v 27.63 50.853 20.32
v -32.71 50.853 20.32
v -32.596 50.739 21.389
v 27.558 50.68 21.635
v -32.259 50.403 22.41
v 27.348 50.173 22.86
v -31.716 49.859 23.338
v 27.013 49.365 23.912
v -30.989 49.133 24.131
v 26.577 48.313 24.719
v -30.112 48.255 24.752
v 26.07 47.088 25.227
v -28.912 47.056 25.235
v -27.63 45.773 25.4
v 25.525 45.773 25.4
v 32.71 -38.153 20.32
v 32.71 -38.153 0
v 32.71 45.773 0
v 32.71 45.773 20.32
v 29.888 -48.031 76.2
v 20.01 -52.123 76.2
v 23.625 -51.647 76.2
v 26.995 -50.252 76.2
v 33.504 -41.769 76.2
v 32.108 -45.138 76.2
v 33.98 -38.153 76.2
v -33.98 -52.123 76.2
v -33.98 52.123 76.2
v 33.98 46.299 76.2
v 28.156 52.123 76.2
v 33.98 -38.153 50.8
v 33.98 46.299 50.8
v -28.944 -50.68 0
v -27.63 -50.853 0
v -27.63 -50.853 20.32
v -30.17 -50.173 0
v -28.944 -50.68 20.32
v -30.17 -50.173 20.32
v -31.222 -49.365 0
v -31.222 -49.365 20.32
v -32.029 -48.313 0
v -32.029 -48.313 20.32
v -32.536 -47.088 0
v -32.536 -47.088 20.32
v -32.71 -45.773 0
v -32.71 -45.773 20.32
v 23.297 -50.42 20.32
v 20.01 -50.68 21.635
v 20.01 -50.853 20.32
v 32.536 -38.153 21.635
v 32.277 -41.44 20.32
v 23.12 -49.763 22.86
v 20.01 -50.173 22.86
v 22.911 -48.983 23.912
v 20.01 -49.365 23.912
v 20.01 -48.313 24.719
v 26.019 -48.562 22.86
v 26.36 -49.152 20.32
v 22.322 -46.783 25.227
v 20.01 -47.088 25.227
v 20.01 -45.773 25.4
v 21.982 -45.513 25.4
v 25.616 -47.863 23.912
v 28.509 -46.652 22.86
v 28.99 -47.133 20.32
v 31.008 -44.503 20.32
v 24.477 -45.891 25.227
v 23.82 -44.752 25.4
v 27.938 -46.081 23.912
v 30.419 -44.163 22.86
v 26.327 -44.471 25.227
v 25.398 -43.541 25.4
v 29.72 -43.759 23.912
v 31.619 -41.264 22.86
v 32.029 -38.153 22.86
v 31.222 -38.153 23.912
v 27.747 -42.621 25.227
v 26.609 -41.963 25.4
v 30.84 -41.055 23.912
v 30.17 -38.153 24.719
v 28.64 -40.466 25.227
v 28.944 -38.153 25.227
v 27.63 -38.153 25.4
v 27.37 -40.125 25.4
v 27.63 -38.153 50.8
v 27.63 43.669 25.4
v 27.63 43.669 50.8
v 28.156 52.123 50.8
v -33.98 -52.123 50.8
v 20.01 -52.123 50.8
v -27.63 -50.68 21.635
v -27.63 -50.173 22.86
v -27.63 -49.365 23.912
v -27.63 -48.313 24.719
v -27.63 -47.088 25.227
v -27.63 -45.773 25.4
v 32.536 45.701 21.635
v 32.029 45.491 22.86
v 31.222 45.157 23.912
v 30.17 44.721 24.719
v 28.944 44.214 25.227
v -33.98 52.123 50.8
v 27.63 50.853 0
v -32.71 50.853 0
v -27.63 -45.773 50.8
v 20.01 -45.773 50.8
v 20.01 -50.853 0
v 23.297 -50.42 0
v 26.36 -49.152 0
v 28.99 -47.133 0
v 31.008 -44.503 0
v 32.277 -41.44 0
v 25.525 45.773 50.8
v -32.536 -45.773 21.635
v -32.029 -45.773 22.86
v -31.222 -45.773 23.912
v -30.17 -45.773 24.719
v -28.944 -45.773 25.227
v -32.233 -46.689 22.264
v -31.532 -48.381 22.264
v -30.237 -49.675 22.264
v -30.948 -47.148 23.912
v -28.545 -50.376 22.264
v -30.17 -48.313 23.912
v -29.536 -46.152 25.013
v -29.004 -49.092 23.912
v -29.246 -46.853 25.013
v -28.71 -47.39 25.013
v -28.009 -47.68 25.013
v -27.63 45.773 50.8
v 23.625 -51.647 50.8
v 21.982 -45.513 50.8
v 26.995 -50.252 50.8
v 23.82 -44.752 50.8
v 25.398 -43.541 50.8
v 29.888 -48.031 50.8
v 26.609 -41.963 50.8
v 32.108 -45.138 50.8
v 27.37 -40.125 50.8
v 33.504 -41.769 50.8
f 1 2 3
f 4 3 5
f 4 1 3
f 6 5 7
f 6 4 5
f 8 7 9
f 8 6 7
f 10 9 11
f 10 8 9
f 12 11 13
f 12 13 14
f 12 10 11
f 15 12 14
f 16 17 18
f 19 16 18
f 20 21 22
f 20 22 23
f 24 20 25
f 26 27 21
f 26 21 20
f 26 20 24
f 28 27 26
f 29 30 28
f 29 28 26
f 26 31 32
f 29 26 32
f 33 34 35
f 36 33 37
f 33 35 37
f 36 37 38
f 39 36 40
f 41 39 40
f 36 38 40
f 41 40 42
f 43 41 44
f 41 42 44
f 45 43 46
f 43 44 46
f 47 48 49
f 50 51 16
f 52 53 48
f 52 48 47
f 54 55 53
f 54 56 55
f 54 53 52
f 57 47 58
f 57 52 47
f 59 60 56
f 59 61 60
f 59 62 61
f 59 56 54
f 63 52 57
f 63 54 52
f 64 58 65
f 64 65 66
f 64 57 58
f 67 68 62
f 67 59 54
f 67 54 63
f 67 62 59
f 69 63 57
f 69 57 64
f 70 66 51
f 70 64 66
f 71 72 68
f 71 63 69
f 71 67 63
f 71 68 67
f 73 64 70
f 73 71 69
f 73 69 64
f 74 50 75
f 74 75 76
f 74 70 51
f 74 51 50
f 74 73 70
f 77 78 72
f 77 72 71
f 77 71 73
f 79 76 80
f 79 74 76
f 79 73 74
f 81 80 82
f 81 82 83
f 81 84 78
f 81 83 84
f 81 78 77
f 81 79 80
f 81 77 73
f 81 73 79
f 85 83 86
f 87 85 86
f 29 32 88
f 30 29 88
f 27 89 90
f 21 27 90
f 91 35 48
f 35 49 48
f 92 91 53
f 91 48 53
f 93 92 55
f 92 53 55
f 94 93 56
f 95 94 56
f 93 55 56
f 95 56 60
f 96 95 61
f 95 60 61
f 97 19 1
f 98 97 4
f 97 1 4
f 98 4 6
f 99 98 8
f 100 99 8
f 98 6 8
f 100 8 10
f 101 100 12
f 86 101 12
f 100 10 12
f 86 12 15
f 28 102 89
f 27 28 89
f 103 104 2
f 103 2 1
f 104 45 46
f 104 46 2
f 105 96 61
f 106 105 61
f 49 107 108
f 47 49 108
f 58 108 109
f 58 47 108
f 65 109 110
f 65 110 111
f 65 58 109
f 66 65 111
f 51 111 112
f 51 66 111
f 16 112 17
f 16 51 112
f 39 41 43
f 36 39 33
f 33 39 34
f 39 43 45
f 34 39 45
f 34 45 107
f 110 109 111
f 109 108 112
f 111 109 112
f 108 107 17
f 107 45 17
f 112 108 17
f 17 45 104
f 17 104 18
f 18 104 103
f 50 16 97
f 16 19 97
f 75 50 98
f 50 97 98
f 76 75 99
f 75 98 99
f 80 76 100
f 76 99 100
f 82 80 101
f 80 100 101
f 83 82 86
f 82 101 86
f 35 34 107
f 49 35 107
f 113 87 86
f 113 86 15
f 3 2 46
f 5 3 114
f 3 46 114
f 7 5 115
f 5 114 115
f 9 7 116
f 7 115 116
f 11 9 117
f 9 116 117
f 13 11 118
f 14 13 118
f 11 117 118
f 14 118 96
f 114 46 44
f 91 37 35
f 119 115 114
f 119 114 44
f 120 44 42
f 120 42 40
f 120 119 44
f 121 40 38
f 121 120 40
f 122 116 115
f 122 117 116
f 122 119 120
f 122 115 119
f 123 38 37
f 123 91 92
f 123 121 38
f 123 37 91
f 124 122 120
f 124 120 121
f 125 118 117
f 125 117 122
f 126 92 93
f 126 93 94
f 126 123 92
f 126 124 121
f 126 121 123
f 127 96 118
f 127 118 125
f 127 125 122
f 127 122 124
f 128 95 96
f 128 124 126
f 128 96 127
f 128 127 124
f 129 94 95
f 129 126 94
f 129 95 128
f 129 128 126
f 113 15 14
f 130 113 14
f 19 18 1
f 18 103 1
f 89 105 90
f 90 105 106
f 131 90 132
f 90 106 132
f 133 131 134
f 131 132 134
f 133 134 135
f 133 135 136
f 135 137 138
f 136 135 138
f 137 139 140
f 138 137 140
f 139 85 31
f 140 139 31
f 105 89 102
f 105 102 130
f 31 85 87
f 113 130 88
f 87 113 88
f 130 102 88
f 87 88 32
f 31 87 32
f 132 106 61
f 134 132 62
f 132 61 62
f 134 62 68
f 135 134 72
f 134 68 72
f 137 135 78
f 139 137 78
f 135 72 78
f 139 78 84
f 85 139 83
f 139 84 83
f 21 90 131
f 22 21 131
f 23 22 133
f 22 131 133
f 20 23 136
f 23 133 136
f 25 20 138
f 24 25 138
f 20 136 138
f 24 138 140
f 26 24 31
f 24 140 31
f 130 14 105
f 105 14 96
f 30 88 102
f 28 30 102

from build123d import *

# Parameters (mm, degrees)
F0_W     = 65.419092
F0_H     = 101.706258
F1_DEPTH = 25.4
F2_SIZE  = 5.08
F3_R     = 5.08
F4_R     = 12.7
F5_R     = 5.08
F6_DEPTH = 25.4
F8_DEPTH = 25.4


with BuildPart() as f1:
    # F0 (on Top) → F1 (new body)
    with BuildSketch(Plane.XY):
        Rectangle(F0_W, F0_H)
    extrude(amount=F1_DEPTH)

    # F2
    f2_edges = [f1.edges().sort_by_distance(p)[0] for p in [
        (32.709546, 50.853129, 12.7),
    ]]
    chamfer(f2_edges, length=F2_SIZE)

    # F3
    f3_edges = [f1.edges().sort_by_distance(p)[0] for p in [
        (-32.709546, -50.853129, 12.7),
    ]]
    fillet(f3_edges, radius=F3_R)

    # F4
    f4_edges = [f1.edges().sort_by_distance(p)[0] for p in [
        (32.709546, -50.853129, 12.7),
    ]]
    fillet(f4_edges, radius=F4_R)

    # F5
    f5_edges = [f1.edges().sort_by_distance(p)[0] for p in [
        (32.709546, 3.81, 25.4),
        (-3.81, -50.853129, 25.4),
        (28.989803, -47.133386, 25.4),
        (-31.221649, -49.365232, 25.4),
        (-32.709546, 2.54, 25.4),
        (30.169546, 48.313129, 25.4),
        (-2.54, 50.853129, 25.4),
    ]]
    fillet(f5_edges, radius=F5_R)

    # F1_face (on face) → F6 (join)
    with BuildSketch(Plane(origin=(-0.075869, 0.08909, 25.4), x_dir=(1, 0, 0), z_dir=(0, 0, 1))):
        with BuildLine():
            Line((-27.553677, 45.68404), (-27.553677, -45.862219))
            Line((-27.553677, -45.862219), (20.085415, -45.862219))
            ThreePointArc((20.085415, -45.862219), (25.473569, -43.630373), (27.705415, -38.242219))
            Line((27.705415, -38.242219), (27.705415, 43.579835))
            Line((27.705415, 43.579835), (25.60121, 45.68404))
            Line((25.60121, 45.68404), (-27.553677, 45.68404))
        make_face()
    extrude(amount=F6_DEPTH)

    # F7 (on face) → F8 (join)
    with BuildSketch(Plane.XY.offset(50.8)):
        with BuildLine():
            Line((28.155598, 52.123129), (-33.979546, 52.123129))
            Line((-33.979546, 52.123129), (-33.979546, -52.123129))
            Line((-33.979546, -52.123129), (20.009546, -52.123129))
            ThreePointArc((20.009546, -52.123129), (29.887828, -48.031411), (33.979546, -38.153129))
            Line((33.979546, -38.153129), (33.979546, 46.299181))
            Line((33.979546, 46.299181), (28.155598, 52.123129))
        make_face()
    extrude(amount=F8_DEPTH)


solid = f1.part
